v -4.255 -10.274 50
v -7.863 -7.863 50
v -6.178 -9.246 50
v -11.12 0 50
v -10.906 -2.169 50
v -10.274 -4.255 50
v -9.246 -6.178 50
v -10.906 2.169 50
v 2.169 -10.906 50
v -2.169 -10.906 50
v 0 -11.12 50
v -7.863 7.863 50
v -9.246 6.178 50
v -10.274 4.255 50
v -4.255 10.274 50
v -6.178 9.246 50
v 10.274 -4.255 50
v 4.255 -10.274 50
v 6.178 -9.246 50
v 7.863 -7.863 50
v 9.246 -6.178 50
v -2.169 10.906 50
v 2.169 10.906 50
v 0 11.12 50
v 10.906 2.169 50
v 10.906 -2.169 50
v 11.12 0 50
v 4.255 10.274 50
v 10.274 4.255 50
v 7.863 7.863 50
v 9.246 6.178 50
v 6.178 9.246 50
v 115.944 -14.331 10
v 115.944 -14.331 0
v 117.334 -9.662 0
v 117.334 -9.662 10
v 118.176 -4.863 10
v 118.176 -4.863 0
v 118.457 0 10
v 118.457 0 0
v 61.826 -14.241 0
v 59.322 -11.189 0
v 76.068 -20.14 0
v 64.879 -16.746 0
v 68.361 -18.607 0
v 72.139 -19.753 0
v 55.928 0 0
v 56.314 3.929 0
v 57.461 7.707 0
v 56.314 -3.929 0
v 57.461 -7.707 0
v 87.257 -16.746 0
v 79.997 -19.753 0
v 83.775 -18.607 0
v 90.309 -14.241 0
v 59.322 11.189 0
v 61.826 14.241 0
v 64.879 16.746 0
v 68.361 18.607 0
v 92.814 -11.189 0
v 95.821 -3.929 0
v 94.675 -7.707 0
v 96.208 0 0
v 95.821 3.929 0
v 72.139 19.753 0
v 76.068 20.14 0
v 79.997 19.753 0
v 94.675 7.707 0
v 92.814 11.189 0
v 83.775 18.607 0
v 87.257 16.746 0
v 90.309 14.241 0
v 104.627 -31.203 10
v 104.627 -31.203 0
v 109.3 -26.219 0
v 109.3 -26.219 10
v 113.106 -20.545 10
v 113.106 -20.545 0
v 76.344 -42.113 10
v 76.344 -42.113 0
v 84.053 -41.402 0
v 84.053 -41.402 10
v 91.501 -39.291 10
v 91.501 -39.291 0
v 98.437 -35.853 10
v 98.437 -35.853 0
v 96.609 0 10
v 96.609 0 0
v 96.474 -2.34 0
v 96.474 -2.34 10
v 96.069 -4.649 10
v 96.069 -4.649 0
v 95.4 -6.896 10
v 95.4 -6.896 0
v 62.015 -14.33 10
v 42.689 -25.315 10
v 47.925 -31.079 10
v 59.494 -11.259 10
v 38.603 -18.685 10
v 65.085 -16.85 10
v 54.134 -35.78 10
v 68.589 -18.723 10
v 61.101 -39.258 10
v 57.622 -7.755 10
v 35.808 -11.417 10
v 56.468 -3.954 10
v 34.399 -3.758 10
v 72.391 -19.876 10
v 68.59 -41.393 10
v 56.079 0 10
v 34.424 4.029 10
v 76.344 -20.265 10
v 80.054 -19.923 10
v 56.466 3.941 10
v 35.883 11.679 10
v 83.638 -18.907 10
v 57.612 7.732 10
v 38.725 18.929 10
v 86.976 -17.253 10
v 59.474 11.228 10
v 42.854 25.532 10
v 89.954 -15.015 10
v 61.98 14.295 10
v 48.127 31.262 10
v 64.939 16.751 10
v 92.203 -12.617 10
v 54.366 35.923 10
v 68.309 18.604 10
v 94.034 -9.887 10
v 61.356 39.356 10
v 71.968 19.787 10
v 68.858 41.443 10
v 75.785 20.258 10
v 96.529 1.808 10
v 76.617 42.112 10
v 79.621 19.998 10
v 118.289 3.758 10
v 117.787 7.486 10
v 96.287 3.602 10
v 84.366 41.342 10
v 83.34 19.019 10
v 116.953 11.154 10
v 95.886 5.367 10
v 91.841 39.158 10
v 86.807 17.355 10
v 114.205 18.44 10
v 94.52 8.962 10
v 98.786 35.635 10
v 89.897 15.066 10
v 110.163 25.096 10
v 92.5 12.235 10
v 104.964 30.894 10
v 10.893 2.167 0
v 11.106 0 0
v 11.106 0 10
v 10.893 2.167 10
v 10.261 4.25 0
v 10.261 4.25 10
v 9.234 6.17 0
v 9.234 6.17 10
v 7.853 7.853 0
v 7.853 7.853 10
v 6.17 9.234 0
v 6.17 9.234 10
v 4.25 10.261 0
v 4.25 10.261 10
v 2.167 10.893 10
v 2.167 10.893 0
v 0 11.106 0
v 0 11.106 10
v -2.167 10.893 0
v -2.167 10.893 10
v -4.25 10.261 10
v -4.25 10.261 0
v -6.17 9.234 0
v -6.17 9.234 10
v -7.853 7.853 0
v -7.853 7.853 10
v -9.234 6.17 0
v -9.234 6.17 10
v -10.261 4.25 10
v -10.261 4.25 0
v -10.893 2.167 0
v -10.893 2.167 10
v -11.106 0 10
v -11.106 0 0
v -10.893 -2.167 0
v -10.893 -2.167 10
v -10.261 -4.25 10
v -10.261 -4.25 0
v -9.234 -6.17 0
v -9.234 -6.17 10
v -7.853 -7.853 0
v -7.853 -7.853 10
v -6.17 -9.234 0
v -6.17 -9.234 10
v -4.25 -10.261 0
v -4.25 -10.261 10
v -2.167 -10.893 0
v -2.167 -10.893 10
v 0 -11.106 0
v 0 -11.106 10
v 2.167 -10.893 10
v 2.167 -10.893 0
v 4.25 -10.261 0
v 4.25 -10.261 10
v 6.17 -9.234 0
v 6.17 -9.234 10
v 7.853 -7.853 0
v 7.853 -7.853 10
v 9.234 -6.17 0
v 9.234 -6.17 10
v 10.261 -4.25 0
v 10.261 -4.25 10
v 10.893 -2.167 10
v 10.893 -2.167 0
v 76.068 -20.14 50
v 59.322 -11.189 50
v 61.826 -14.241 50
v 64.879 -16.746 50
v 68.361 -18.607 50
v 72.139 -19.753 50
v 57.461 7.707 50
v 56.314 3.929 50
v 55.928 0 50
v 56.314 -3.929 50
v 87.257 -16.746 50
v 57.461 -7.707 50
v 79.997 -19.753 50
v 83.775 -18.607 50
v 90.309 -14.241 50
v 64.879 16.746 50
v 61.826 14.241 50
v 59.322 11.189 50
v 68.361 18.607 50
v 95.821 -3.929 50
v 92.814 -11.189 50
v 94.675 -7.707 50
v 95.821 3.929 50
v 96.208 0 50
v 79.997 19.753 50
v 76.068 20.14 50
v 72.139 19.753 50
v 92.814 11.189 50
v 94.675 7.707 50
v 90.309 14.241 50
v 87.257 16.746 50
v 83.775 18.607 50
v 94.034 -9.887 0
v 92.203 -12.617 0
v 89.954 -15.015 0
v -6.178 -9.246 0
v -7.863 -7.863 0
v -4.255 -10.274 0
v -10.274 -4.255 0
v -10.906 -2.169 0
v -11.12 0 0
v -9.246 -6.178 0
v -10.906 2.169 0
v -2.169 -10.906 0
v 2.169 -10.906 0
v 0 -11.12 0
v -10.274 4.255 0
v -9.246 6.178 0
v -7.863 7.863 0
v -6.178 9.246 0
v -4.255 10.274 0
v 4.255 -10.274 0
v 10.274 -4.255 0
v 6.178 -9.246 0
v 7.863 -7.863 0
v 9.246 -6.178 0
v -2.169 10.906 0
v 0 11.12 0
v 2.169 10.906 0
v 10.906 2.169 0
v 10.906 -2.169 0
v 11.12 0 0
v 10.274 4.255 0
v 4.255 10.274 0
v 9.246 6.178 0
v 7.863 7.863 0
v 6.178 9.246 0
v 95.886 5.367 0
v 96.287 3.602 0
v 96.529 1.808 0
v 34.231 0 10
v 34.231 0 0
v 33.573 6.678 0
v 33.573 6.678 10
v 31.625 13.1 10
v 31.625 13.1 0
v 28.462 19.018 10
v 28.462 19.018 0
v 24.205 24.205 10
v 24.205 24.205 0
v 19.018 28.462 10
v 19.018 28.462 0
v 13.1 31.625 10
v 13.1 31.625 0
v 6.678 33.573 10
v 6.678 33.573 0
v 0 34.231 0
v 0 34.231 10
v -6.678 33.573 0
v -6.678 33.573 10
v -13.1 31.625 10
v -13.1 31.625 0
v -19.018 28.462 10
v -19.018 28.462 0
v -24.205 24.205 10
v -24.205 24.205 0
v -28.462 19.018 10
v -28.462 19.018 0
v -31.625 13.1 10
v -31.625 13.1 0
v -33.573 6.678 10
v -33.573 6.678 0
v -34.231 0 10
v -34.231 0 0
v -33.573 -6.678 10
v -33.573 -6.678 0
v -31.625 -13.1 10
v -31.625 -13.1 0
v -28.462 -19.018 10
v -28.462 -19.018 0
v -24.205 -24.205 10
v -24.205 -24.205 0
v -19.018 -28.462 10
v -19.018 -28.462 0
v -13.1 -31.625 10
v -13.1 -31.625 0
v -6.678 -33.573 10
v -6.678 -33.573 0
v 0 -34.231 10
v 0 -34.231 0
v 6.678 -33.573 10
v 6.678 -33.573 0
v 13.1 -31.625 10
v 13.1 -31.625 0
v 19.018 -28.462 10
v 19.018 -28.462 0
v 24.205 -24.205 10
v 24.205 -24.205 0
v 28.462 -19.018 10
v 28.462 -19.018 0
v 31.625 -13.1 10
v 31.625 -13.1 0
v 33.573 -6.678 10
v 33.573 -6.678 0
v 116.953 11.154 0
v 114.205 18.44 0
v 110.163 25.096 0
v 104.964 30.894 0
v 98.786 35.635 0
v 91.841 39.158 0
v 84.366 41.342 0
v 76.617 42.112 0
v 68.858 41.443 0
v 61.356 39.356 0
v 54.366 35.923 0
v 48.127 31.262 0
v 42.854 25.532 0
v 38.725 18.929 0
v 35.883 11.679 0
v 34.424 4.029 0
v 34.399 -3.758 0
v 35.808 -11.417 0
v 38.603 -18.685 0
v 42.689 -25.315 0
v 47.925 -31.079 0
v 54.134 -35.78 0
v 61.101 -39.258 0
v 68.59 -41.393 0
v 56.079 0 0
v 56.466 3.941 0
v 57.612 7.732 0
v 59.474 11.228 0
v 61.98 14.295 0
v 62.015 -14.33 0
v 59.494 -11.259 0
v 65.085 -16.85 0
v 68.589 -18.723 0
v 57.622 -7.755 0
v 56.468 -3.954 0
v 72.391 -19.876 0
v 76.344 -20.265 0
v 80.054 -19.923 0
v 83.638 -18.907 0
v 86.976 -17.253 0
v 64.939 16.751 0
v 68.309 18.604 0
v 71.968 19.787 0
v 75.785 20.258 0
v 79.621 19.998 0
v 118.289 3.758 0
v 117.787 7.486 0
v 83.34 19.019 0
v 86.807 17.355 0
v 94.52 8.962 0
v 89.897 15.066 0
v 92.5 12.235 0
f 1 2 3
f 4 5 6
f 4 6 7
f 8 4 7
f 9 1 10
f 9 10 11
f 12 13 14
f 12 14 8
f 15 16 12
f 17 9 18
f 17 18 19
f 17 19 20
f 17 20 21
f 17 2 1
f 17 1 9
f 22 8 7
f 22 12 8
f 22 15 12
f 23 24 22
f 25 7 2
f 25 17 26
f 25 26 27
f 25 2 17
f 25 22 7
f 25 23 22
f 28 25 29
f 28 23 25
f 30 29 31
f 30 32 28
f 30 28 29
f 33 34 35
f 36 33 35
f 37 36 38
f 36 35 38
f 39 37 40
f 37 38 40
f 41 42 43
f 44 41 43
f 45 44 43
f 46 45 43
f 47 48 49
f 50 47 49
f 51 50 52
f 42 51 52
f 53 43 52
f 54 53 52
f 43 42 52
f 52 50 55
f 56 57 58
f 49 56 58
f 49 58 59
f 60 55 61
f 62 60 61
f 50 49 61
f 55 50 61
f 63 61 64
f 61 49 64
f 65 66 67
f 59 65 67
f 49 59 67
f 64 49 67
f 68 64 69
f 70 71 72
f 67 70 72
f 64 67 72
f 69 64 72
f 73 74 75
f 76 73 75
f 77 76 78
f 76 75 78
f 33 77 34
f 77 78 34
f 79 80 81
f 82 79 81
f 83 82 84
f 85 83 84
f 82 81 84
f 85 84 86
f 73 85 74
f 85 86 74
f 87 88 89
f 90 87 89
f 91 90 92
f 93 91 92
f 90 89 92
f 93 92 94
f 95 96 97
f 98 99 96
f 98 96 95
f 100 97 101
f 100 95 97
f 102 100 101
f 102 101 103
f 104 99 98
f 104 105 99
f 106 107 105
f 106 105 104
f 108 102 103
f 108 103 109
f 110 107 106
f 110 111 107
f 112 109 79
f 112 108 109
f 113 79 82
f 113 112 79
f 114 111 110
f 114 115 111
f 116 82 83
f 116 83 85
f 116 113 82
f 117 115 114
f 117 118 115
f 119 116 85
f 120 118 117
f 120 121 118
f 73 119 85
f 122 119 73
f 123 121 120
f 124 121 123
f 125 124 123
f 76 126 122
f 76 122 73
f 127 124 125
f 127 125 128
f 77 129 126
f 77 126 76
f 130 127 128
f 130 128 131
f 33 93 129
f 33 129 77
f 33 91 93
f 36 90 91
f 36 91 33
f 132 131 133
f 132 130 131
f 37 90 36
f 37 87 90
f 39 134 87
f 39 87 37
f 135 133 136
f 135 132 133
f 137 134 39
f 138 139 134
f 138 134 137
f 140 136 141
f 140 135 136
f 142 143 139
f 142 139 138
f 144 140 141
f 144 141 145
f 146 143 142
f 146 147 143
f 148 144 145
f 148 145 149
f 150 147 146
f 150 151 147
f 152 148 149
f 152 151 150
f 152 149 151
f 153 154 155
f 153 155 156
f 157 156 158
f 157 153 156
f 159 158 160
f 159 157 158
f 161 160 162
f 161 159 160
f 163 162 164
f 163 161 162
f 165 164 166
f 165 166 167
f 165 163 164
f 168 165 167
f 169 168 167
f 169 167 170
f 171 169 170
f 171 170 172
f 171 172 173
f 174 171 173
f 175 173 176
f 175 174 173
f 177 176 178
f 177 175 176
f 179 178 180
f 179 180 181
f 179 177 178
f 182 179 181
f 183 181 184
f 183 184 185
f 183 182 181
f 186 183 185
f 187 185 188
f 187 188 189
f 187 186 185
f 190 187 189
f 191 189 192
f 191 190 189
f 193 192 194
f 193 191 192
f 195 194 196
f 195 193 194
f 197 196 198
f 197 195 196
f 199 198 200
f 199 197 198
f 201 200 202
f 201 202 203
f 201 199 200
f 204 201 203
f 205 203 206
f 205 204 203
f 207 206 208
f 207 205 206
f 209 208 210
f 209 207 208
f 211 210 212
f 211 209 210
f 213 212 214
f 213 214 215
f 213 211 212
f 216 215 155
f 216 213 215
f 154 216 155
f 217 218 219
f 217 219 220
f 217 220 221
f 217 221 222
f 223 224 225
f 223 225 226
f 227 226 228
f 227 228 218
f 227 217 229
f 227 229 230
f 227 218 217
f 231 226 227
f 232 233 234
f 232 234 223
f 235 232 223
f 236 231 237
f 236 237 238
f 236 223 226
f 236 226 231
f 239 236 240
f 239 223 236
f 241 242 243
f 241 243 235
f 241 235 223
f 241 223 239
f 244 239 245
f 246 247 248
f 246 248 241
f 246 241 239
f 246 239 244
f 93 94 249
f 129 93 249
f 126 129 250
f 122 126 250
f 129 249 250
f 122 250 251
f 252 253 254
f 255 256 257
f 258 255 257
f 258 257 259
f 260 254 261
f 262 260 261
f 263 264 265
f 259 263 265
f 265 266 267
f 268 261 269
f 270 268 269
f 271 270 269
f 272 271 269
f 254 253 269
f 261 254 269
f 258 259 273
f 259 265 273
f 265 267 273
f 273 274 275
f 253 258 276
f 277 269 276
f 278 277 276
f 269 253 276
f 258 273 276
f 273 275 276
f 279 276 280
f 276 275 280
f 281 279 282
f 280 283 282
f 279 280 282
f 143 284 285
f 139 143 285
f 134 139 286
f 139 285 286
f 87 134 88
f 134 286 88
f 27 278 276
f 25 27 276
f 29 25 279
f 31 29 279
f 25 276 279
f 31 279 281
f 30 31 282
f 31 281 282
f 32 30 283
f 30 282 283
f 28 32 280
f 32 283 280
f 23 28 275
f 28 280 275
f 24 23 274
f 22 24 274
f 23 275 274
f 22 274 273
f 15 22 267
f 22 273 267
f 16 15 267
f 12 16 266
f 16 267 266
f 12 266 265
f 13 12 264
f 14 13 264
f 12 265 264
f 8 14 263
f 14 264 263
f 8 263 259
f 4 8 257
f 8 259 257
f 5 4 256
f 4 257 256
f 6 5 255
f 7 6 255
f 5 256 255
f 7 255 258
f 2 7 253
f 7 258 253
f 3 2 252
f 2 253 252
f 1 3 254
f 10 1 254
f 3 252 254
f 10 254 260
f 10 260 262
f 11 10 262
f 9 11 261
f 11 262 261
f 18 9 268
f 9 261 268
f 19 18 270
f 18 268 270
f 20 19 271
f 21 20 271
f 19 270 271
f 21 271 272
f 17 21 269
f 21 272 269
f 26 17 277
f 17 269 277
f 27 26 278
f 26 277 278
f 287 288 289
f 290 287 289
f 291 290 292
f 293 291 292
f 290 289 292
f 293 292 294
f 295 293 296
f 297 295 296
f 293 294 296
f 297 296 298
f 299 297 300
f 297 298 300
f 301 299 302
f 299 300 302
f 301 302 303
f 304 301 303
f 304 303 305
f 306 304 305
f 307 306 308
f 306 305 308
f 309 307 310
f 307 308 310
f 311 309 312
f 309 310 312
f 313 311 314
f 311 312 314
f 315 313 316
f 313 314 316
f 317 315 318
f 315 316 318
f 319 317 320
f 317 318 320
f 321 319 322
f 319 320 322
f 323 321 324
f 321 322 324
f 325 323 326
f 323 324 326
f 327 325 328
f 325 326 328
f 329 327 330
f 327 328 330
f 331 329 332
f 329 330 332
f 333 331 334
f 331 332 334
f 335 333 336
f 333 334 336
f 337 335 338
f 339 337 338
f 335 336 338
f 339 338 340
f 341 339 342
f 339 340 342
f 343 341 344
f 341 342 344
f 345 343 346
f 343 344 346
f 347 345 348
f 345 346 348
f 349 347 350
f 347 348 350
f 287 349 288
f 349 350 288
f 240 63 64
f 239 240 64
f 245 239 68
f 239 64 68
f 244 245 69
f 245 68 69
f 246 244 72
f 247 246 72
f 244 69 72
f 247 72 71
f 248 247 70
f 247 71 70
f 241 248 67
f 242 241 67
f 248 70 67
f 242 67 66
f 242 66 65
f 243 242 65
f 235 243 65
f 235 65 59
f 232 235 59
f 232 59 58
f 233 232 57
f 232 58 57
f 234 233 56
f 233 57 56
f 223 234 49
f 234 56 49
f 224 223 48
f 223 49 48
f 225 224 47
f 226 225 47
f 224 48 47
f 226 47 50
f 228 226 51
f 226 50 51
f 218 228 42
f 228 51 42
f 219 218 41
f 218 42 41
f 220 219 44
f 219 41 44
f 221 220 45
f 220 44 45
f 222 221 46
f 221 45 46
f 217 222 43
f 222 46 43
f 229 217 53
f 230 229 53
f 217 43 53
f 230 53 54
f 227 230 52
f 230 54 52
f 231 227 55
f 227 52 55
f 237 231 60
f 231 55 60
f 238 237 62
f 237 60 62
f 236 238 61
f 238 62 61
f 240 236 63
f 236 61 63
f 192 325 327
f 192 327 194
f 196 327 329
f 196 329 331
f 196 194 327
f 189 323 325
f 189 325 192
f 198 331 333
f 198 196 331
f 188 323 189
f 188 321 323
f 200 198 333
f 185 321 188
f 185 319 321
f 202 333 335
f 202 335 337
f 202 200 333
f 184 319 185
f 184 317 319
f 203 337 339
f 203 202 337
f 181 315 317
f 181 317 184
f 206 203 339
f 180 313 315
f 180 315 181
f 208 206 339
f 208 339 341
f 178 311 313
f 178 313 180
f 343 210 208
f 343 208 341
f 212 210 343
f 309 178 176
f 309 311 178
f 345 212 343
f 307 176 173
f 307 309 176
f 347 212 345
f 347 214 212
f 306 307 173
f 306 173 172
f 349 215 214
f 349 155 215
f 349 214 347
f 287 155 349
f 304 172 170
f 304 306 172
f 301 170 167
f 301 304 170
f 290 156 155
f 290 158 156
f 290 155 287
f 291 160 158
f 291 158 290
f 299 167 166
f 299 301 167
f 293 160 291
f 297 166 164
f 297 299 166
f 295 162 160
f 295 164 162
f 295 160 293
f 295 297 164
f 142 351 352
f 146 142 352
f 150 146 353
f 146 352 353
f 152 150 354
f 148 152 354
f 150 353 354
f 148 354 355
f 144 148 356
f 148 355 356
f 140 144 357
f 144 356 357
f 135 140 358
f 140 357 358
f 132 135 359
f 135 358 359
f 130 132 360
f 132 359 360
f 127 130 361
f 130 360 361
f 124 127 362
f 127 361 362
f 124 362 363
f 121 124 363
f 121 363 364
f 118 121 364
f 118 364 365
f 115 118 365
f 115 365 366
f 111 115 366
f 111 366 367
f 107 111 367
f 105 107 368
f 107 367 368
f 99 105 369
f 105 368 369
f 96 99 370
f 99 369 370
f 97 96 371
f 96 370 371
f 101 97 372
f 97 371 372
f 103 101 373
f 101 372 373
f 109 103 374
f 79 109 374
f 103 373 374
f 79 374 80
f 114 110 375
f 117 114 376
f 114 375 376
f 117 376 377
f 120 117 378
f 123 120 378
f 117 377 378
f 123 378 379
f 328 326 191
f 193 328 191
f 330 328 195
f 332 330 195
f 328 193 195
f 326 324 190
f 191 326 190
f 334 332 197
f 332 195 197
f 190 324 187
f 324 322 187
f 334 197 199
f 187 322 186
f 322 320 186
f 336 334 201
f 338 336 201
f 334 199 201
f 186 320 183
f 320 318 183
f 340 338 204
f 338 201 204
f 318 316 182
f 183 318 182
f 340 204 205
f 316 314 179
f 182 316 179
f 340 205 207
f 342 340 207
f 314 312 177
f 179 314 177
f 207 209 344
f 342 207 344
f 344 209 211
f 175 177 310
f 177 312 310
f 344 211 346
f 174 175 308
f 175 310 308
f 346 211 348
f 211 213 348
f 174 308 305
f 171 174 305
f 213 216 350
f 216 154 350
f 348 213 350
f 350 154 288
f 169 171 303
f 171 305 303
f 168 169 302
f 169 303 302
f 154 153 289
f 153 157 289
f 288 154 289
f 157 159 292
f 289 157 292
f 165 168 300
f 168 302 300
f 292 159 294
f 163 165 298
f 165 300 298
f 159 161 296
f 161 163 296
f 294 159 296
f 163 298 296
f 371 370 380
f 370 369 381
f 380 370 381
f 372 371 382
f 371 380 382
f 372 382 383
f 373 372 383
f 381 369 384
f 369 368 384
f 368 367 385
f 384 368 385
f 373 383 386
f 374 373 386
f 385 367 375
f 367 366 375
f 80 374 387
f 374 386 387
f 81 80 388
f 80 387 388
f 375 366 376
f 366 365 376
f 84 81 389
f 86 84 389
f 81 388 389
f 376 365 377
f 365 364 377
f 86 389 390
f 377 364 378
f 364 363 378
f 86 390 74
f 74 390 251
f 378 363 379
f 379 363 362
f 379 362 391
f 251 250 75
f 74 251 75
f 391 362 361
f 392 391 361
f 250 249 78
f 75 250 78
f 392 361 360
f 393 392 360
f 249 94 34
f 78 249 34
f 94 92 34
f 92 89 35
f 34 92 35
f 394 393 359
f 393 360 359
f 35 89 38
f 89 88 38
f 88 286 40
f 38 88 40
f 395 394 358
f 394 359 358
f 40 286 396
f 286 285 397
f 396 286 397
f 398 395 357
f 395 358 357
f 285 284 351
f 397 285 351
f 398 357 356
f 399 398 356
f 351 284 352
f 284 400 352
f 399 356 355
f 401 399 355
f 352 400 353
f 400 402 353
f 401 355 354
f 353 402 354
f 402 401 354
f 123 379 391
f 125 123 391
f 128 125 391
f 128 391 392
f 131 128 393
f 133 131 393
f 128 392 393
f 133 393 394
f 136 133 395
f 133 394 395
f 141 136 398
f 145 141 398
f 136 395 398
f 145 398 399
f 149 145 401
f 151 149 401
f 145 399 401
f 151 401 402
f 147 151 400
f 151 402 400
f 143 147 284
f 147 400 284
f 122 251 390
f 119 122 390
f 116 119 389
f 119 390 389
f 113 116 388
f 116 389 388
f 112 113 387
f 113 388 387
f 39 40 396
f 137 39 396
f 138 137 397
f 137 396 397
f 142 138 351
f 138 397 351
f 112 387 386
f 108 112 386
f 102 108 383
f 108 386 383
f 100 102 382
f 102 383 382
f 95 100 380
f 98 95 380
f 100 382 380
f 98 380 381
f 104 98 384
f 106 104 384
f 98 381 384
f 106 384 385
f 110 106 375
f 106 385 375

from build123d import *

# Parameters (mm, degrees)
F0_R     = 34.2310248754
F0_R_2   = 11.1062371849
F1_DEPTH = 10
F2_R     = 11.1200511456
F3_DEPTH = 50
F2_R_2   = 20.1404233558


with BuildPart() as f1:
    # F0 (on Top) → F1 (new body)
    with BuildSketch(Plane.XY):
        Circle(F0_R)
        Circle(F0_R_2, mode=Mode.SUBTRACT)
    extrude(amount=F1_DEPTH)


with BuildPart() as f1b:
    # F0 (on Top) → F1, piece 2 (new body)
    with BuildSketch(Plane.XY):
        with BuildLine():
            Line((56.0789567465, 0), (34.2310248754, 0))
            ThreePointArc((34.2310248754, 0), (46.5656859572, -29.7785060709), (76.344192028, -42.1131671526))
            Line((76.344192028, -42.1131671526), (76.344192028, -20.2652352815))
            ThreePointArc((76.344192028, -20.2652352815), (62.0145067381, -14.3296852899), (56.0789567465, 0))
        make_face()
        with BuildLine():
            ThreePointArc((46.4935230312, 29.7061678455), (37.4171765972, 16.0687994969), (34.2310248754, 0))
            Line((34.2310248754, 0), (56.0789567465, 0))
            ThreePointArc((56.0789567465, 0), (57.6121616477, 7.7324510246), (61.9797812883, 14.2948754845))
            Line((61.9797812883, 14.2948754845), (46.4935230312, 29.7061678455))
        make_face()
        with BuildLine():
            Line((76.344192028, -20.2652352815), (76.344192028, -42.1131671526))
            ThreePointArc((76.344192028, -42.1131671526), (91.5012663794, -39.2909906306), (104.6268649587, -31.2027123744))
            Line((104.6268649587, -31.2027123744), (89.9540689403, -15.0150261888))
            ThreePointArc((89.9540689403, -15.0150261888), (83.6379127021, -18.9071785242), (76.344192028, -20.2652352815))
        make_face()
        with BuildLine():
            ThreePointArc((91.2459690531, 39.3885248406), (67.4388929292, 41.1608369155), (46.4935230312, 29.7061678455))
            Line((46.4935230312, 29.7061678455), (61.9797812883, 14.2948754845))
            ThreePointArc((61.9797812883, 14.2948754845), (72.0588819055, 19.8069653953), (83.5150613296, 18.9541128644))
            Line((83.5150613296, 18.9541128644), (91.2459690531, 39.3885248406))
        make_face()
        with BuildLine():
            Line((89.9540689403, -15.0150261888), (104.6268649587, -31.2027123744))
            ThreePointArc((104.6268649587, -31.2027123744), (111.3181360131, -23.4593710434), (115.9440742914, -14.330672432))
            Line((115.9440742914, -14.330672432), (95.4000119876, -6.8960486283))
            ThreePointArc((95.4000119876, -6.8960486283), (93.1739688295, -11.2888606081), (89.9540689403, -15.0150261888))
        make_face()
        with BuildLine():
            ThreePointArc((116.9533938564, 11.1539936563), (107.4836265302, 28.3523273561), (91.2459690531, 39.3885248406))
            Line((91.2459690531, 39.3885248406), (83.5150613296, 18.9541128644))
            ThreePointArc((83.5150613296, 18.9541128644), (91.3287683349, 13.643395249), (95.8857056517, 5.3674021941))
            Line((95.8857056517, 5.3674021941), (116.9533938564, 11.1539936563))
        make_face()
        with BuildLine():
            Line((95.4000119876, -6.8960486283), (115.9440742914, -14.330672432))
            ThreePointArc((115.9440742914, -14.330672432), (117.8242794713, -7.274695411), (118.4573591807, 0))
            ThreePointArc((118.4573591807, 0), (118.0796742474, 5.6274658191), (116.9533938564, 11.1539936563))
            Line((116.9533938564, 11.1539936563), (95.8857056517, 5.3674021941))
            ThreePointArc((95.8857056517, 5.3674021941), (96.4276819185, 2.70798723), (96.6094273096, 0))
            ThreePointArc((96.6094273096, 0), (96.3047836523, -3.5006489436), (95.4000119876, -6.8960486283))
        make_face()
    extrude(amount=F1_DEPTH)


with BuildPart() as f3:
    # F2 (on Top) → F3 (new body)
    with BuildSketch(Plane.XY):
        Circle(F2_R)
    extrude(amount=F3_DEPTH)


with BuildPart() as f3b:
    # F2 (on Top) → F3, piece 2 (new body)
    with BuildSketch(Plane.XY):
        with Locations((76.0679244995, 0)):
            Circle(F2_R_2)
    extrude(amount=F3_DEPTH)


solid = Compound([f1.part, f1b.part, f3.part, f3b.part])
